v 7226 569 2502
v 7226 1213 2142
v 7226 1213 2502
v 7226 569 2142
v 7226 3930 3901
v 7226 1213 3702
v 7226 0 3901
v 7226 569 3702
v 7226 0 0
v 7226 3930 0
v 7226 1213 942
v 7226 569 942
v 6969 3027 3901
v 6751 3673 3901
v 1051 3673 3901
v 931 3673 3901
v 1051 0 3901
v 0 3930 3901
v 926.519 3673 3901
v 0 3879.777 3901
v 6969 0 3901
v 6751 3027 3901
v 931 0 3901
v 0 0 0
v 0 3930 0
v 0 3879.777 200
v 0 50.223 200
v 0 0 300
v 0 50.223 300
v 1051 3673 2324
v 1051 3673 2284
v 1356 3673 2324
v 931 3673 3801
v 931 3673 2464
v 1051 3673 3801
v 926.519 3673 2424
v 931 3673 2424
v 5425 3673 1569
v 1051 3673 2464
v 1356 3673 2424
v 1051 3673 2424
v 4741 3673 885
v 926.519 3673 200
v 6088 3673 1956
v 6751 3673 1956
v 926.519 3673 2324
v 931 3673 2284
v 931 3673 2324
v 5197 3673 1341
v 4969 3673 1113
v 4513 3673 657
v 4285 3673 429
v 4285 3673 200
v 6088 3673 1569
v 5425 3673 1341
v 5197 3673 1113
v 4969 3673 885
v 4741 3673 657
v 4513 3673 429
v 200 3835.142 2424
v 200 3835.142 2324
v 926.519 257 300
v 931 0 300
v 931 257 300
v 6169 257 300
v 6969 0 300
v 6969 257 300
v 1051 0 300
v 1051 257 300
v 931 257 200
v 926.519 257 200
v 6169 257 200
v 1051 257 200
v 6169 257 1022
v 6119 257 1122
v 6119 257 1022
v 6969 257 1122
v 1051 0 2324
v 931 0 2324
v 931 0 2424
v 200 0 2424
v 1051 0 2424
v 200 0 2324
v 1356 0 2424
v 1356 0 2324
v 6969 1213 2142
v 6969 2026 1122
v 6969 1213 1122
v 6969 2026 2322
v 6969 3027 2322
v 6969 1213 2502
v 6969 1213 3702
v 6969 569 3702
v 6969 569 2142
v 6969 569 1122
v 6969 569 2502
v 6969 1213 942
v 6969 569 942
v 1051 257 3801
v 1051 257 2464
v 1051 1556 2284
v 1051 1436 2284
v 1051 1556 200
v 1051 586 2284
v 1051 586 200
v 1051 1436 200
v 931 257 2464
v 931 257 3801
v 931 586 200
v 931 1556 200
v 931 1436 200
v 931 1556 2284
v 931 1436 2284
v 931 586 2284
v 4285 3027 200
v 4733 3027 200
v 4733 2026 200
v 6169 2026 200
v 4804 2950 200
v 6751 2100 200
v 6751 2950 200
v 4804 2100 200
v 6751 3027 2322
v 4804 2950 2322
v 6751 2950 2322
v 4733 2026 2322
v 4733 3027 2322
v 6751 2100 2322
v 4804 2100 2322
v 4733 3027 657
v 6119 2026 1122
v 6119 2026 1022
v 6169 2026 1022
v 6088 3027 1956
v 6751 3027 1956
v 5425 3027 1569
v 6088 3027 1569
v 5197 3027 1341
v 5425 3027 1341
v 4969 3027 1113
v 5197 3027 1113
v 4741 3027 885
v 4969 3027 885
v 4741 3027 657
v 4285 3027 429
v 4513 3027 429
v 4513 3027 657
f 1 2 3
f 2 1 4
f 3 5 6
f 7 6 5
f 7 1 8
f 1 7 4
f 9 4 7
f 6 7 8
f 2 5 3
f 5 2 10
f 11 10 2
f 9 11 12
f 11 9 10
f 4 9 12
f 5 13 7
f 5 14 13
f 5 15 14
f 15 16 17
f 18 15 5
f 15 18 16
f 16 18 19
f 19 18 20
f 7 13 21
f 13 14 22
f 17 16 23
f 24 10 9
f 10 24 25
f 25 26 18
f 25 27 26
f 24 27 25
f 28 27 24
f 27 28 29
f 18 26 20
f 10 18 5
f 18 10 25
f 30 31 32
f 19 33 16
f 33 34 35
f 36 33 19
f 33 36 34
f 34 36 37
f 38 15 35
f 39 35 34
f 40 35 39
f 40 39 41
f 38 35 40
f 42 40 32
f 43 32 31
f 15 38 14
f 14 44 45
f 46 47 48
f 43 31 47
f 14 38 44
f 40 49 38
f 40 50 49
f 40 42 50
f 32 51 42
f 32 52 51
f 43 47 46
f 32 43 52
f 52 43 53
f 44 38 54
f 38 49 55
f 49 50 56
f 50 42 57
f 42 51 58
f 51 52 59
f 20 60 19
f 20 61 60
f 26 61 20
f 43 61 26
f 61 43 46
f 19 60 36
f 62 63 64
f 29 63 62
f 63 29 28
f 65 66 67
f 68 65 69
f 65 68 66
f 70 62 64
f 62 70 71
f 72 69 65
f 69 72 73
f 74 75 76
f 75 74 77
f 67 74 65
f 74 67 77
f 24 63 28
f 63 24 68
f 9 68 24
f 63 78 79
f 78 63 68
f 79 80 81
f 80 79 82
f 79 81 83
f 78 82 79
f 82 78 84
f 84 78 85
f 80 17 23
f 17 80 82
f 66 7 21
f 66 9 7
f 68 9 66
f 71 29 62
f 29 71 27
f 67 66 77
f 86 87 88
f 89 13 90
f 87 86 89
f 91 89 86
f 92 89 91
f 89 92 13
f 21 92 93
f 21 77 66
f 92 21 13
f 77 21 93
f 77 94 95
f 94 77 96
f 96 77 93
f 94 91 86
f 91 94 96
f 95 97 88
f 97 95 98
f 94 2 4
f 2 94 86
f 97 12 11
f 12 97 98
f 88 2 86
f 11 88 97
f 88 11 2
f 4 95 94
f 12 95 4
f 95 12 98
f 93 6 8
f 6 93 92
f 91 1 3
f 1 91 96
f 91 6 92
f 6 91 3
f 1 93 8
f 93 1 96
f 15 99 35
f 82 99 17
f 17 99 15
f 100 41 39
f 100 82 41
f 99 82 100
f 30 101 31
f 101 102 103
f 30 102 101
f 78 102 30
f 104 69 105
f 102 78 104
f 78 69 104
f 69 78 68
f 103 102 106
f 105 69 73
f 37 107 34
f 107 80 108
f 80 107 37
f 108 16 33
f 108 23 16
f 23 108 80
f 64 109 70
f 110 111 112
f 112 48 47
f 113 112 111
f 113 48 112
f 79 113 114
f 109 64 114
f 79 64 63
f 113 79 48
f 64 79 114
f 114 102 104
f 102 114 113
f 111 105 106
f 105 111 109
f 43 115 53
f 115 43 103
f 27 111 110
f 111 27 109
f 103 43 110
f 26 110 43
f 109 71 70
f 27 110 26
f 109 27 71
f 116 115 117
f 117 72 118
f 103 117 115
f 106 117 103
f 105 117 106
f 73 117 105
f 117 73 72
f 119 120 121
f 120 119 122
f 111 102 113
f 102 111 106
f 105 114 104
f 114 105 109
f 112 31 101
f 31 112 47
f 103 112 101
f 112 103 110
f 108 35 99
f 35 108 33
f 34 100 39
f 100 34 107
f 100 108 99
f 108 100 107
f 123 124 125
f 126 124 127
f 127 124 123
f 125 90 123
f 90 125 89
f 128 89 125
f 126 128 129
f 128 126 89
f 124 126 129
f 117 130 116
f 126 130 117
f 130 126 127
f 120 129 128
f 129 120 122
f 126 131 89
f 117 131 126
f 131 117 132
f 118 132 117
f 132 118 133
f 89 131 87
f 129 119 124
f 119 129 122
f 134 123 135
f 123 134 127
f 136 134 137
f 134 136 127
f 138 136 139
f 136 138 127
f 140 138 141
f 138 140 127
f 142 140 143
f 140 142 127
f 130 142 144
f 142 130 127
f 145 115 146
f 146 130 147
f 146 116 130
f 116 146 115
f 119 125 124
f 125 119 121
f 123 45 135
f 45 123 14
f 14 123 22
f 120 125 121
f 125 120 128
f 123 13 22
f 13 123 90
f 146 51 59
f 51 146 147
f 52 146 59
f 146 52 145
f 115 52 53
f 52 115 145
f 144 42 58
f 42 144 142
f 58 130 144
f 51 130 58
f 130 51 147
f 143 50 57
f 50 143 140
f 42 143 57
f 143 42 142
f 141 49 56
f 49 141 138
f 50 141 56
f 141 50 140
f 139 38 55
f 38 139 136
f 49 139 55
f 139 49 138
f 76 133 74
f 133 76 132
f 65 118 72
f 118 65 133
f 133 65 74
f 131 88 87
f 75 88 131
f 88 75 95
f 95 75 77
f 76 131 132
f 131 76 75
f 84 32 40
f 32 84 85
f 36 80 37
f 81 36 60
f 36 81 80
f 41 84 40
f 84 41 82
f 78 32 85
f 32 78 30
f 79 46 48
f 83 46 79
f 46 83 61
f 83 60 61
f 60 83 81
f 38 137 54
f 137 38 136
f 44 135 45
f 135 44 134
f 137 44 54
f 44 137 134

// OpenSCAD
groundLength = 7226;
groundWidth = 3930;
groundHeight = 200;

wallsHeight = 3701 + groundHeight;
wallsThickness = 257;

terraceLength = 931;
windowLength = 120;

bathroomLength = 71 + 1947 + 218;
bathroomWidth = 74 + 850 + 77;
bathroomHeight = 2122;
bathroomYOffset = 1769 + wallsThickness;

technicLength = 69 + 1475;
technicWidth = groundWidth - bathroomYOffset - bathroomWidth - wallsThickness;
technicHeight = 1369;

ventLength = 218;
ventWidth1 = bathroomWidth;
ventWidth2 = technicWidth;

stairStepLength = 228;
stairStepHeights = [229, 457, 685, 913, 1141];

kitchenLength = 800;
kitchenWidth = 1769;
kitchenHeight = 922;

echo(["technicWidth", technicWidth]);



// ground plate
cube([groundLength, groundWidth, groundHeight]);

// left wall
difference()
{
	translate([0, groundWidth - wallsThickness, 0])
		cube([groundLength, wallsThickness, wallsHeight]);

	linear_extrude(wallsHeight + 1, center = false)
		polygon([
			[-1, groundWidth - 50],
			[-1, groundWidth - wallsThickness - 1],
			[terraceLength, groundWidth - wallsThickness - 1]
		]);
}

// right wall
difference()
{
	cube([groundLength, wallsThickness, groundHeight + 100]);

	linear_extrude(groundHeight + 100 + 1, center = false)
		polygon([
			[-1, 50],
			[-1, wallsThickness + 1],
			[terraceLength, wallsThickness + 1]
		]);
}

// back wall
translate([groundLength - wallsThickness, 0, 0])
	difference()
	{
		cube([wallsThickness, groundWidth, wallsHeight]);

		translate([-1, 569, 742 + groundHeight])
			cube([wallsThickness + 2, 644, 1200]);
		
		translate([-1, 569, 2302 + groundHeight])
			cube([wallsThickness + 2, 644, 1200]);
	};

// front wall (window)
translate([200, 0, groundHeight + 2124])
	cube([terraceLength + windowLength + 205 - 100, groundWidth, 100]);
translate([terraceLength, 0, 0])
	difference()
	{
		cube([windowLength, groundWidth, wallsHeight]);

		translate([-1, 586, groundHeight])
			cube([windowLength + 2, 850, 2084]);

		windowYOffset = groundWidth - wallsThickness - 586 - 850 - 120;
		translate([-1, 586 + 850 + 120, groundHeight])
			cube([windowLength + 2, windowYOffset, 2084]);

		translate([-1, wallsThickness, groundHeight + 2264])
			cube([
				windowLength + 2,
				groundWidth - 2 * wallsThickness,
				wallsHeight - groundHeight - 2264 - 100,
			]);
	};

//bathroom
translate([
	groundLength - wallsThickness - bathroomLength,
	bathroomYOffset,
	groundHeight
])
{
	cube([bathroomLength, 74, bathroomHeight]);
	cube([71, bathroomWidth, bathroomHeight]);

	translate([0, bathroomWidth - 77, 0])
		cube([bathroomLength, 77, bathroomHeight]);
}

//technic
translate([
	groundLength - technicLength - wallsThickness,
	groundWidth - technicWidth - wallsThickness,
	groundHeight
])
	cube([technicLength, technicWidth, technicHeight]);

// vent
translate([
	groundLength - wallsThickness - ventLength,
	bathroomYOffset,
	groundHeight
])
{
	cube([ventLength, bathroomWidth, bathroomHeight]);
	translate([0, ventWidth1, 0])
		cube([ventLength, ventWidth2, wallsHeight - groundHeight]);
}

// stairs
translate([
	groundLength - wallsThickness - technicLength
		- len(stairStepHeights) * stairStepLength,
	groundWidth - wallsThickness - technicWidth,
	groundHeight
])
	for (i = [0 : len(stairStepHeights) - 1])
		translate([i * stairStepLength, 0, 0])
			cube([stairStepLength, technicWidth, stairStepHeights[i]]);

// last step
translate([
	groundLength - wallsThickness - technicLength / 2 - ventLength / 2,
	groundWidth - wallsThickness - technicWidth,
	groundHeight + technicHeight
])
	cube([technicLength / 2, technicWidth, 387]);

// 2nd floor
/*
translate([
	groundLength - wallsThickness - bathroomLength,
	0,
	bathroomHeight + groundHeight
])
{
	cube([bathroomLength, bathroomYOffset + bathroomWidth, 100]);
}
*/

// kitchen
translate([
	groundLength - wallsThickness - kitchenLength,
	wallsThickness,
	groundHeight
])
{
	cube([kitchenLength, kitchenWidth, kitchenHeight - 100]);
	translate([-50, 0, kitchenHeight - 100])
		cube([kitchenLength + 50, kitchenWidth, 100]);
}
